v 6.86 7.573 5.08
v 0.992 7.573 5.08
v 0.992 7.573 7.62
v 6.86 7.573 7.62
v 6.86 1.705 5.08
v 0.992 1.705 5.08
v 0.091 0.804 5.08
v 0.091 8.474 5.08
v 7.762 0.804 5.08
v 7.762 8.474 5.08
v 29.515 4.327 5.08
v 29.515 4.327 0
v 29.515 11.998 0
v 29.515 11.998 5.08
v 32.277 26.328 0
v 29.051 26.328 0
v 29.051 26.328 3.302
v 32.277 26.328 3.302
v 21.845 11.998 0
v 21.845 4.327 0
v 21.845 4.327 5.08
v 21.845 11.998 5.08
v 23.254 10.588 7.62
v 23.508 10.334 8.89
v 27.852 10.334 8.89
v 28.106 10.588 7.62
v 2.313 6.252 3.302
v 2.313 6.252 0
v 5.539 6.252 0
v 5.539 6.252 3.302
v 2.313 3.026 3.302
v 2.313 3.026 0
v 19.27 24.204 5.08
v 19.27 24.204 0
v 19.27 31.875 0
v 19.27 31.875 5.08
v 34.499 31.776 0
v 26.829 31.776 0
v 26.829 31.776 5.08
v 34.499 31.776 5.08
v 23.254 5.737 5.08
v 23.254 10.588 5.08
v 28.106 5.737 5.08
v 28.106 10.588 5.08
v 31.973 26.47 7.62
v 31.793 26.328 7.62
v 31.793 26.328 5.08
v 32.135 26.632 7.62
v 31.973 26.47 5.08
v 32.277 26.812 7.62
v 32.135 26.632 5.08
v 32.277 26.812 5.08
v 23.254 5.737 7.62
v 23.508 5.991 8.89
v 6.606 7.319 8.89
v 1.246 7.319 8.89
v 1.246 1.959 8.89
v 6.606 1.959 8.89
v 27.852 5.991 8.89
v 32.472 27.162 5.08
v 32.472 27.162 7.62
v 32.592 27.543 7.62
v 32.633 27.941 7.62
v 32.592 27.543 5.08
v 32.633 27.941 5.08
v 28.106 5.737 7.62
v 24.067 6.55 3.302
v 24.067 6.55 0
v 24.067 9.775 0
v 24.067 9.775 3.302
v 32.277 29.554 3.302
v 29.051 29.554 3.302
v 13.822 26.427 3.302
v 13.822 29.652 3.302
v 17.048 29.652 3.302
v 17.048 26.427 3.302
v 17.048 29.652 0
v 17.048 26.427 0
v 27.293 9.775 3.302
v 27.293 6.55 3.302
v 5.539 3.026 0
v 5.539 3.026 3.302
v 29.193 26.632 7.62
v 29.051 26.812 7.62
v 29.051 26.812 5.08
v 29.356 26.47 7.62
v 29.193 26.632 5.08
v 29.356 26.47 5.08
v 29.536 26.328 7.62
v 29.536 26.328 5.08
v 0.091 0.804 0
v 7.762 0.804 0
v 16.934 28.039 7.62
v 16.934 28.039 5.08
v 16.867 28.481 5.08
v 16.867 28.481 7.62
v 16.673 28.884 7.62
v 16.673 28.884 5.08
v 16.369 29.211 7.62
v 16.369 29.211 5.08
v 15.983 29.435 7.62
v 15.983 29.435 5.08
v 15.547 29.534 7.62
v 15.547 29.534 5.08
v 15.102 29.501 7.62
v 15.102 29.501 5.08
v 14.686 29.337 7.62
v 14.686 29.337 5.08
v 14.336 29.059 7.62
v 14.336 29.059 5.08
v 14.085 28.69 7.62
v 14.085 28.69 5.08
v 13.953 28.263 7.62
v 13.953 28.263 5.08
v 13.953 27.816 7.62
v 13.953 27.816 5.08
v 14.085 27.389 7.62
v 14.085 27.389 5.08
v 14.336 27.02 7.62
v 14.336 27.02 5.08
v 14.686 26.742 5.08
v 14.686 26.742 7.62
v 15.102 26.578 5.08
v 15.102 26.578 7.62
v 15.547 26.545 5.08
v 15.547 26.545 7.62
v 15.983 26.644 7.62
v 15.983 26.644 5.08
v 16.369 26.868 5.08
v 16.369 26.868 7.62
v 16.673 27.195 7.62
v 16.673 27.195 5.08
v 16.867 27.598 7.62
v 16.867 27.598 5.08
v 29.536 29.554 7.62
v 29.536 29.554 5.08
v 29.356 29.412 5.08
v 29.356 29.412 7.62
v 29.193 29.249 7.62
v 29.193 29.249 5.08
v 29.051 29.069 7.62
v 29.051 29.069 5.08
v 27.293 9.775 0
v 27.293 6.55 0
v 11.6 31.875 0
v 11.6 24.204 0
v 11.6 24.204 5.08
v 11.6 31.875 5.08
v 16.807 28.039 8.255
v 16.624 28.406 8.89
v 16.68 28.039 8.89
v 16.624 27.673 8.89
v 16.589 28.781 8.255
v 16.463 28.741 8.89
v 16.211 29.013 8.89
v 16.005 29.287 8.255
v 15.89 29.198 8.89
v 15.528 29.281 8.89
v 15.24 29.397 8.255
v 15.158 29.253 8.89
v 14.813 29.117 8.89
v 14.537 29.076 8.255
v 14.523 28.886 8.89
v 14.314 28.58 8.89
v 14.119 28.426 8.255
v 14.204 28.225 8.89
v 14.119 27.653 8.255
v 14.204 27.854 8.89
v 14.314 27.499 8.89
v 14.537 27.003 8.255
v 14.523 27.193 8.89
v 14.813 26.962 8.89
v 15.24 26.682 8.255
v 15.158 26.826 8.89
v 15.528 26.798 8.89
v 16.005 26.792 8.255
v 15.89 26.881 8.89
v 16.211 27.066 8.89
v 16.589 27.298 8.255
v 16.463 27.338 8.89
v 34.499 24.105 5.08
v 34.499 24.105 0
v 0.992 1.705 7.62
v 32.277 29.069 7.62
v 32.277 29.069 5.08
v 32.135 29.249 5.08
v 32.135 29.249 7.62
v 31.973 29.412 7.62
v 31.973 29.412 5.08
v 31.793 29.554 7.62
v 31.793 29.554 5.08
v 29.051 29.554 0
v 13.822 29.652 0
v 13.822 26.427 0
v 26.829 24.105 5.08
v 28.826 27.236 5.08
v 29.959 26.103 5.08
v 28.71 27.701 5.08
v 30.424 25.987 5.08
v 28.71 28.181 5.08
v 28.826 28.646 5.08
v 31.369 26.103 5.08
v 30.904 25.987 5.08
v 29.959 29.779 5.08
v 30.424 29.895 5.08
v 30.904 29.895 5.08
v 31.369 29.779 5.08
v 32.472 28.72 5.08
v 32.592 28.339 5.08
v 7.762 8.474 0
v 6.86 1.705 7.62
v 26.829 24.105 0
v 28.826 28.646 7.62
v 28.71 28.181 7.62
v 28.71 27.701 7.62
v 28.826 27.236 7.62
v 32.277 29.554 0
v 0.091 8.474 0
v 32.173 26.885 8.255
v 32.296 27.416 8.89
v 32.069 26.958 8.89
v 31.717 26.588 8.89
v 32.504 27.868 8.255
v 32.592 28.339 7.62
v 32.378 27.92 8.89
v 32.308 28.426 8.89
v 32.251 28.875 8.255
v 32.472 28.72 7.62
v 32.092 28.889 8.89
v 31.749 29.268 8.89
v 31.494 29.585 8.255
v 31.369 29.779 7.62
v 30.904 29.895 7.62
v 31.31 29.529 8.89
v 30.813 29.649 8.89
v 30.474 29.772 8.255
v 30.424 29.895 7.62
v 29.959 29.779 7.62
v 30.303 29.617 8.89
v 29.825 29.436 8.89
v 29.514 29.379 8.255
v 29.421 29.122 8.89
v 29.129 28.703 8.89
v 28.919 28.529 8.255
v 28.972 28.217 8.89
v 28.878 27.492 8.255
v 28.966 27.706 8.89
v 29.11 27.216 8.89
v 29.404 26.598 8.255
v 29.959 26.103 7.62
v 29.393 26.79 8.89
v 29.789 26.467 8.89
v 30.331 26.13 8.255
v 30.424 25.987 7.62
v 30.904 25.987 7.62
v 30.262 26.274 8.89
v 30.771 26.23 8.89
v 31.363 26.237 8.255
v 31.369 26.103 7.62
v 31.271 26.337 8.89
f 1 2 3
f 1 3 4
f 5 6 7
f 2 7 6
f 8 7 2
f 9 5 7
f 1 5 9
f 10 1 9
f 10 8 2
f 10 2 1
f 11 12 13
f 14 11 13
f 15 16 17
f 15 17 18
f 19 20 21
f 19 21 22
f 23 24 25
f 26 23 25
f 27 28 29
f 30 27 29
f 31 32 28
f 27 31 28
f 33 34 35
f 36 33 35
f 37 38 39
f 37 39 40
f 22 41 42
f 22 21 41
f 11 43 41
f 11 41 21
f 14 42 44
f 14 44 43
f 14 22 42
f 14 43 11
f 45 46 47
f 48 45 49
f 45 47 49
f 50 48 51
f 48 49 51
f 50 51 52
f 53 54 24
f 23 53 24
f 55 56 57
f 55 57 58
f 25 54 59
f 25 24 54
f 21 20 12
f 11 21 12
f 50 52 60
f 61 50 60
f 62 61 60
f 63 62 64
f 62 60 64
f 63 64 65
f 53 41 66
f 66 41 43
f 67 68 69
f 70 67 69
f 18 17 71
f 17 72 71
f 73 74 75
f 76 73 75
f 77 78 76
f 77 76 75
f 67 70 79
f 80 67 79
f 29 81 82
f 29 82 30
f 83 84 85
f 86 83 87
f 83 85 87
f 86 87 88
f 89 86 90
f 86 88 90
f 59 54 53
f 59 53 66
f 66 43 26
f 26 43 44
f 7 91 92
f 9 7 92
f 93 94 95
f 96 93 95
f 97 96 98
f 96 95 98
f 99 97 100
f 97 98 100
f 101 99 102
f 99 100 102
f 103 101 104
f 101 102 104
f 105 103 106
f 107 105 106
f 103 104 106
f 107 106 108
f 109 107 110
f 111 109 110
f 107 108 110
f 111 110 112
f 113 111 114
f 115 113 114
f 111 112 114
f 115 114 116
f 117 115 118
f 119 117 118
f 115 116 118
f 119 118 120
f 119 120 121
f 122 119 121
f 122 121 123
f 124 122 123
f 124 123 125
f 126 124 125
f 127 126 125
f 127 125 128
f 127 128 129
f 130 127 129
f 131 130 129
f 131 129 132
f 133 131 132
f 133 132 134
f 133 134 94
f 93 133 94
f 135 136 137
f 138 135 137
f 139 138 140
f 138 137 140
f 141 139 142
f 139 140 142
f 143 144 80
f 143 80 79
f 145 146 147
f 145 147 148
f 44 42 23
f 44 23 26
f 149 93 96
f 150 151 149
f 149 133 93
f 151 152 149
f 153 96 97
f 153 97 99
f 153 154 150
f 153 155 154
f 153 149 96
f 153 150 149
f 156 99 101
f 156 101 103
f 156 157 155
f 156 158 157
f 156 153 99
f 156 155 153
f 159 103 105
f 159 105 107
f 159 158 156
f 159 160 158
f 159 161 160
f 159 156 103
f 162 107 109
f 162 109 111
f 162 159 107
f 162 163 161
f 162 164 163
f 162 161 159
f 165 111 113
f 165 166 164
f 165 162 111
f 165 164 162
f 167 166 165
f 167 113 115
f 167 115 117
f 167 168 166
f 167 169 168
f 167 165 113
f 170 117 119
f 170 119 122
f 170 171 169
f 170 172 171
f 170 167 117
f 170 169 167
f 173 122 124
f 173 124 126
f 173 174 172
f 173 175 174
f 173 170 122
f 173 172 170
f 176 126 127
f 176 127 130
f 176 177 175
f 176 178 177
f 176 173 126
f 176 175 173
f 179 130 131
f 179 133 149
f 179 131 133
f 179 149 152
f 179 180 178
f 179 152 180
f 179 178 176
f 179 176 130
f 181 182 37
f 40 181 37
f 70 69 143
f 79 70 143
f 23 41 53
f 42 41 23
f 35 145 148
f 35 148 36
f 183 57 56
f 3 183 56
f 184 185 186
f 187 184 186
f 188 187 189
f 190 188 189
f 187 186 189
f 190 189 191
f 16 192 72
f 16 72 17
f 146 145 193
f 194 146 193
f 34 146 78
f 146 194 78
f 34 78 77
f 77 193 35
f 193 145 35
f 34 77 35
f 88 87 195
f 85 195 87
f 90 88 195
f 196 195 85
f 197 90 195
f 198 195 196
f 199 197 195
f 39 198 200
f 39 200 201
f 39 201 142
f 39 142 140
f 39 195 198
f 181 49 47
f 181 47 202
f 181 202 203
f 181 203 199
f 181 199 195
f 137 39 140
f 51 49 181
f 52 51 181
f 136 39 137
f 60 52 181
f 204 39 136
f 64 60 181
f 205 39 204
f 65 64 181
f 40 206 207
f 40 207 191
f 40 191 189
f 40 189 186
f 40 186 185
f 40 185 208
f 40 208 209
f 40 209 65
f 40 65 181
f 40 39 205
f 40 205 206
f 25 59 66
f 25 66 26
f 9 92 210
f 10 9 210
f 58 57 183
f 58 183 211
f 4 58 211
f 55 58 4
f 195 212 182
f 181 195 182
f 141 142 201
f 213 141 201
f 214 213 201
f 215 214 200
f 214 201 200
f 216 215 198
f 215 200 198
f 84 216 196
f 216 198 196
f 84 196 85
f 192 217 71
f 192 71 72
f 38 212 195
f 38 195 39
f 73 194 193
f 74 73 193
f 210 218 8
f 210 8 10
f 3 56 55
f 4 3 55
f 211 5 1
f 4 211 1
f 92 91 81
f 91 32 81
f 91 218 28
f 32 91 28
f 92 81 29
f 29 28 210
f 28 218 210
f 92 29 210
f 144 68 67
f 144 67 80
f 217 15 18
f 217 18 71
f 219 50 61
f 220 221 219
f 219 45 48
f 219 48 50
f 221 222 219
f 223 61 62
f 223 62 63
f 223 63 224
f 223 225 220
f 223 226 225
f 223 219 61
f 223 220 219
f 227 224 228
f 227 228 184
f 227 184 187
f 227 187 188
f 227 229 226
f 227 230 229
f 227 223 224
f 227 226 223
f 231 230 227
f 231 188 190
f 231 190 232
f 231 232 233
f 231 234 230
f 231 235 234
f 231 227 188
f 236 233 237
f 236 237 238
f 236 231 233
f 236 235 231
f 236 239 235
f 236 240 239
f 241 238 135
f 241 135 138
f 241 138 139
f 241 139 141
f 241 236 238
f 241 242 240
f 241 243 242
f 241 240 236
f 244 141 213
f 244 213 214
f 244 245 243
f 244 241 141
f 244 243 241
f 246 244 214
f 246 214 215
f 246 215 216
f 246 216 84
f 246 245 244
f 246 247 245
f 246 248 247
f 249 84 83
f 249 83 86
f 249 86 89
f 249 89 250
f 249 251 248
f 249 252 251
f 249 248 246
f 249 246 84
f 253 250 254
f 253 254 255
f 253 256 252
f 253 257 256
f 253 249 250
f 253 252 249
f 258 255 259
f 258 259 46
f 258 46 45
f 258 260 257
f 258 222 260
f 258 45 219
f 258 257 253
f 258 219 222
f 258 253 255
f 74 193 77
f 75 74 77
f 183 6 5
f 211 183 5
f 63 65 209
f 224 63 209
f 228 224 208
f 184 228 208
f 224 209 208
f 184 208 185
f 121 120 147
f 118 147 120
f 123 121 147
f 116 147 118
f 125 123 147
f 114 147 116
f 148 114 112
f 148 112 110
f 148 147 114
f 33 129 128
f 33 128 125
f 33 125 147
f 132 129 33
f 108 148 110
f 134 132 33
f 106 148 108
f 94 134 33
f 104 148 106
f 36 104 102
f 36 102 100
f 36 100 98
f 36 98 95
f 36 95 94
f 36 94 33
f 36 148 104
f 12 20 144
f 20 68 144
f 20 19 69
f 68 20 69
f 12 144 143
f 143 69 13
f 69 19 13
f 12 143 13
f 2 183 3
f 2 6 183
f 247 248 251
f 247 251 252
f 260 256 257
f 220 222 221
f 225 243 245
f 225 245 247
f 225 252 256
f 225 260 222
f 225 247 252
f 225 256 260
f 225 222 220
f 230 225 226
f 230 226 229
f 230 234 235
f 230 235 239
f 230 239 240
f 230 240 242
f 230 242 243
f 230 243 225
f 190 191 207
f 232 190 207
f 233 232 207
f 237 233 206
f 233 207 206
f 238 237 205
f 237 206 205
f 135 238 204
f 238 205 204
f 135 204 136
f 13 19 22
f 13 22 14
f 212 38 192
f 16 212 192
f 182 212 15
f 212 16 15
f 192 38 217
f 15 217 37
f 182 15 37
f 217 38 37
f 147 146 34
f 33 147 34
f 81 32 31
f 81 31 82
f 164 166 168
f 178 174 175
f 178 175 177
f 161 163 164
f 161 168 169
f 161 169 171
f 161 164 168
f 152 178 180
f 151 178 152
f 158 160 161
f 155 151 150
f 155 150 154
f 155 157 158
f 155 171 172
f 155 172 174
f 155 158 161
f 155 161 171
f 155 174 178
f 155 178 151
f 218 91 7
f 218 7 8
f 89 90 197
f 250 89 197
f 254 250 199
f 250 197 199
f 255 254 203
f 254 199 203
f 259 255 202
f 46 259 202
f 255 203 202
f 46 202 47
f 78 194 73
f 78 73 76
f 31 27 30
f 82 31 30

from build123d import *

# Parameters (mm, degrees)
F0_W          = 7.6708
F0_H          = 7.6708
F0_W_2        = 5.8674
F0_H_2        = 5.8674
F0_W_3        = 3.2258
F0_H_3        = 3.2258
F1_DEPTH      = 5.08
F0_R          = 1.4986
F0_W_4        = 4.8514
F0_H_4        = 4.8514
F2_DEPTH      = 8.89
F3_DEPTH      = 8.89
F4_DEPTH      = 8.89
F5_DEPTH      = 8.89
F6_C1_SIZE2   = 0.254
F6_C1_SIZE    = 1.27
F6_C2_SIZE2   = 0.254
F6_C2_SIZE    = 1.27
F6_C3_SIZE2   = 0.254
F6_C3_SIZE    = 1.27
F6_C4_SIZE2   = 0.254
F6_C4_SIZE    = 1.27
F6_4_C1_SIZE2 = 0.254
F6_4_C1_SIZE  = 1.27
F6_4_C2_SIZE2 = 0.254
F6_4_C2_SIZE  = 1.27
F6_4_C3_SIZE2 = 0.254
F6_4_C3_SIZE  = 1.27
F6_4_C4_SIZE2 = 0.254
F6_4_C4_SIZE  = 1.27
F7_DEPTH      = 3.302
F8_DEPTH      = 3.302
F9_DEPTH      = 3.302
F10_DEPTH     = 3.302


# Not quite as in the source:
# - a fillet or chamfer that OpenCascade refuses, or shapes differently, is made with other operations: its cross-section is extruded or revolved along the edge and cut away or added


with BuildPart() as f1:
    # F0 (on Top) → F1 (new body)
    with BuildSketch(Plane.XY):
        with Locations((3.9261005717, 4.6390335905)):
            Rectangle(F0_W, F0_H)
        with Locations((3.9261005717, 4.6390335905)):
            Rectangle(F0_W_2, F0_H_2, mode=Mode.SUBTRACT)
        with Locations((3.9261005717, 4.6390335905)):
            Rectangle(F0_W_2, F0_H_2)
        with Locations((3.9261005717, 4.6390335905)):
            Rectangle(F0_W_3, F0_H_3, mode=Mode.SUBTRACT)
        with Locations((3.9261005717, 4.6390335905)):
            Rectangle(F0_W_3, F0_H_3)
    extrude(amount=F1_DEPTH)

    # F0 (on Top) → F5 (join)
    with BuildSketch(Plane.XY):
        with Locations((3.9261005717, 4.6390335905)):
            Rectangle(F0_W_2, F0_H_2)
        with Locations((3.9261005717, 4.6390335905)):
            Rectangle(F0_W_3, F0_H_3, mode=Mode.SUBTRACT)
        with Locations((3.9261005717, 4.6390335905)):
            Rectangle(F0_W_3, F0_H_3)
    extrude(amount=F5_DEPTH)

    # F6: chamfer of 0.254 x 1.27 on 4 edges, made by hand

    # F6_c1
    f6_c1_edges = [f1.edges().sort_by_distance(p)[0] for p in [
        (3.9261005717, 1.7053335905, 8.89),
    ]]
    f6_c1_side = f1.faces().sort_by_distance((3.9261005717, 1.7053335905, 8.88492))[0]
    chamfer(f6_c1_edges, length=F6_C1_SIZE, length2=F6_C1_SIZE2, reference=f6_c1_side)

    # F6_c2
    f6_c2_edges = [f1.edges().sort_by_distance(p)[0] for p in [
        (6.8598005717, 4.7660335905, 8.89),
    ]]
    f6_c2_side = f1.faces().sort_by_distance((6.8598005717, 4.7660335905, 8.88492))[0]
    chamfer(f6_c2_edges, length=F6_C2_SIZE, length2=F6_C2_SIZE2, reference=f6_c2_side)

    # F6_c3
    f6_c3_edges = [f1.edges().sort_by_distance(p)[0] for p in [
        (3.7991005717, 7.5727335905, 8.89),
    ]]
    f6_c3_side = f1.faces().sort_by_distance((3.7991005717, 7.5727335905, 8.88492))[0]
    chamfer(f6_c3_edges, length=F6_C3_SIZE, length2=F6_C3_SIZE2, reference=f6_c3_side)

    # F6_c4
    f6_c4_edges = [f1.edges().sort_by_distance(p)[0] for p in [
        (0.9924005717, 4.6390335905, 8.89),
    ]]
    f6_c4_side = f1.faces().sort_by_distance((0.9924005717, 4.6390335905, 8.88492))[0]
    chamfer(f6_c4_edges, length=F6_C4_SIZE, length2=F6_C4_SIZE2, reference=f6_c4_side)

    # F0 (on Top) → F10 (cut)
    with BuildSketch(Plane.XY):
        with Locations((3.9261005717, 4.6390335905)):
            Rectangle(F0_W_3, F0_H_3)
    extrude(amount=F10_DEPTH, mode=Mode.SUBTRACT)


with BuildPart() as f1b:
    # F0 (on Top) → F1, piece 2 (new body)
    with BuildSketch(Plane.XY):
        with Locations((30.6640900671, 27.9408358037)):
            Rectangle(F0_W, F0_H)
        with BuildLine():
            Line((29.0511900671, 29.0693506862), (29.0511900671, 29.5537358037))
            Line((29.0511900671, 29.5537358037), (29.5355751847, 29.5537358037))
            ThreePointArc((29.5355751847, 29.5537358037), (30.6640900671, 29.9093358037), (31.7926049496, 29.5537358037))
            Line((31.7926049496, 29.5537358037), (32.2769900671, 29.5537358037))
            Line((32.2769900671, 29.5537358037), (32.2769900671, 29.0693506862))
            ThreePointArc((32.2769900671, 29.0693506862), (32.5415865252, 28.5324431904), (32.6325900671, 27.9408358037))
            ThreePointArc((32.6325900671, 27.9408358037), (32.5415865252, 27.349228417), (32.2769900671, 26.8123209213))
            Line((32.2769900671, 26.8123209213), (32.2769900671, 26.3279358037))
            Line((32.2769900671, 26.3279358037), (31.7926049496, 26.3279358037))
            ThreePointArc((31.7926049496, 26.3279358037), (30.6640900671, 25.9723358037), (29.5355751847, 26.3279358037))
            Line((29.5355751847, 26.3279358037), (29.0511900671, 26.3279358037))
            Line((29.0511900671, 26.3279358037), (29.0511900671, 26.8123209213))
            ThreePointArc((29.0511900671, 26.8123209213), (28.6955900671, 27.9408358037), (29.0511900671, 29.0693506862))
        make_face(mode=Mode.SUBTRACT)
        with BuildLine():
            Line((31.7926049496, 29.5537358037), (29.5355751847, 29.5537358037))
            ThreePointArc((29.5355751847, 29.5537358037), (29.2721503684, 29.3327755025), (29.0511900671, 29.0693506862))
            Line((29.0511900671, 29.0693506862), (29.0511900671, 26.8123209213))
            ThreePointArc((29.0511900671, 26.8123209213), (29.2721503684, 26.548896105), (29.5355751847, 26.3279358037))
            Line((29.5355751847, 26.3279358037), (31.7926049496, 26.3279358037))
            ThreePointArc((31.7926049496, 26.3279358037), (32.0560297659, 26.548896105), (32.2769900671, 26.8123209213))
            Line((32.2769900671, 26.8123209213), (32.2769900671, 29.0693506862))
            ThreePointArc((32.2769900671, 29.0693506862), (32.0560297659, 29.3327755025), (31.7926049496, 29.5537358037))
        make_face()
        with BuildLine():
            Line((29.0511900671, 26.8123209213), (29.0511900671, 29.0693506862))
            ThreePointArc((29.0511900671, 29.0693506862), (28.6955900671, 27.9408358037), (29.0511900671, 26.8123209213))
        make_face()
        with BuildLine():
            ThreePointArc((32.6325900671, 27.9408358037), (32.5415865252, 28.5324431904), (32.2769900671, 29.0693506862))
            Line((32.2769900671, 29.0693506862), (32.2769900671, 26.8123209213))
            ThreePointArc((32.2769900671, 26.8123209213), (32.5415865252, 27.349228417), (32.6325900671, 27.9408358037))
        make_face()
        with BuildLine():
            Line((31.7926049496, 26.3279358037), (29.5355751847, 26.3279358037))
            ThreePointArc((29.5355751847, 26.3279358037), (30.6640900671, 25.9723358037), (31.7926049496, 26.3279358037))
        make_face()
        with BuildLine():
            ThreePointArc((31.7926049496, 29.5537358037), (30.6640900671, 29.9093358037), (29.5355751847, 29.5537358037))
            Line((29.5355751847, 29.5537358037), (31.7926049496, 29.5537358037))
        make_face()
        with BuildLine():
            ThreePointArc((29.5355751847, 26.3279358037), (29.2721503684, 26.548896105), (29.0511900671, 26.8123209213))
            Line((29.0511900671, 26.8123209213), (29.0511900671, 26.3279358037))
            Line((29.0511900671, 26.3279358037), (29.5355751847, 26.3279358037))
        make_face()
        with BuildLine():
            Line((29.5355751847, 29.5537358037), (29.0511900671, 29.5537358037))
            Line((29.0511900671, 29.5537358037), (29.0511900671, 29.0693506862))
            ThreePointArc((29.0511900671, 29.0693506862), (29.2721503684, 29.3327755025), (29.5355751847, 29.5537358037))
        make_face()
        with BuildLine():
            Line((32.2769900671, 29.5537358037), (31.7926049496, 29.5537358037))
            ThreePointArc((31.7926049496, 29.5537358037), (32.0560297659, 29.3327755025), (32.2769900671, 29.0693506862))
            Line((32.2769900671, 29.0693506862), (32.2769900671, 29.5537358037))
        make_face()
        with BuildLine():
            Line((32.2769900671, 26.3279358037), (32.2769900671, 26.8123209213))
            ThreePointArc((32.2769900671, 26.8123209213), (32.0560297659, 26.548896105), (31.7926049496, 26.3279358037))
            Line((31.7926049496, 26.3279358037), (32.2769900671, 26.3279358037))
        make_face()
    extrude(amount=F1_DEPTH)

    # F0 (on Top) → F2 (join)
    with BuildSketch(Plane.XY):
        with BuildLine():
            Line((31.7926049496, 26.3279358037), (29.5355751847, 26.3279358037))
            ThreePointArc((29.5355751847, 26.3279358037), (30.6640900671, 25.9723358037), (31.7926049496, 26.3279358037))
        make_face()
        with BuildLine():
            Line((31.7926049496, 29.5537358037), (29.5355751847, 29.5537358037))
            ThreePointArc((29.5355751847, 29.5537358037), (29.2721503684, 29.3327755025), (29.0511900671, 29.0693506862))
            Line((29.0511900671, 29.0693506862), (29.0511900671, 26.8123209213))
            ThreePointArc((29.0511900671, 26.8123209213), (29.2721503684, 26.548896105), (29.5355751847, 26.3279358037))
            Line((29.5355751847, 26.3279358037), (31.7926049496, 26.3279358037))
            ThreePointArc((31.7926049496, 26.3279358037), (32.0560297659, 26.548896105), (32.2769900671, 26.8123209213))
            Line((32.2769900671, 26.8123209213), (32.2769900671, 29.0693506862))
            ThreePointArc((32.2769900671, 29.0693506862), (32.0560297659, 29.3327755025), (31.7926049496, 29.5537358037))
        make_face()
        with BuildLine():
            Line((29.0511900671, 26.8123209213), (29.0511900671, 29.0693506862))
            ThreePointArc((29.0511900671, 29.0693506862), (28.6955900671, 27.9408358037), (29.0511900671, 26.8123209213))
        make_face()
        with BuildLine():
            ThreePointArc((31.7926049496, 29.5537358037), (30.6640900671, 29.9093358037), (29.5355751847, 29.5537358037))
            Line((29.5355751847, 29.5537358037), (31.7926049496, 29.5537358037))
        make_face()
        with BuildLine():
            ThreePointArc((32.6325900671, 27.9408358037), (32.5415865252, 28.5324431904), (32.2769900671, 29.0693506862))
            Line((32.2769900671, 29.0693506862), (32.2769900671, 26.8123209213))
            ThreePointArc((32.2769900671, 26.8123209213), (32.5415865252, 27.349228417), (32.6325900671, 27.9408358037))
        make_face()
    extrude(amount=F2_DEPTH)

    # F6#2: chamfer of 0.254 x 1.27 on 1 edges, made by hand

    # F6_2_s1 → F6_2_t2 (revolve, cut)
    with BuildSketch(Plane(origin=(23.202503455, 33.1615633992, 0), x_dir=(0, 0, 1), z_dir=(-0.5732867069, -0.8193548387, 0))):
        Polygon((7.62, -11.0751608258), (8.89, -10.8211608258), (8.89, -11.0751608258), align=None)
    revolve(axis=Axis((30.6640900671, 27.9408358037, 8.89), (0, 0, 1)), mode=Mode.SUBTRACT)

    # F0 (on Top) → F7 (cut)
    with BuildSketch(Plane.XY):
        with BuildLine():
            Line((31.7926049496, 29.5537358037), (29.5355751847, 29.5537358037))
            ThreePointArc((29.5355751847, 29.5537358037), (29.2721503684, 29.3327755025), (29.0511900671, 29.0693506862))
            Line((29.0511900671, 29.0693506862), (29.0511900671, 26.8123209213))
            ThreePointArc((29.0511900671, 26.8123209213), (29.2721503684, 26.548896105), (29.5355751847, 26.3279358037))
            Line((29.5355751847, 26.3279358037), (31.7926049496, 26.3279358037))
            ThreePointArc((31.7926049496, 26.3279358037), (32.0560297659, 26.548896105), (32.2769900671, 26.8123209213))
            Line((32.2769900671, 26.8123209213), (32.2769900671, 29.0693506862))
            ThreePointArc((32.2769900671, 29.0693506862), (32.0560297659, 29.3327755025), (31.7926049496, 29.5537358037))
        make_face()
        with BuildLine():
            ThreePointArc((29.5355751847, 26.3279358037), (29.2721503684, 26.548896105), (29.0511900671, 26.8123209213))
            Line((29.0511900671, 26.8123209213), (29.0511900671, 26.3279358037))
            Line((29.0511900671, 26.3279358037), (29.5355751847, 26.3279358037))
        make_face()
        with BuildLine():
            Line((32.2769900671, 26.3279358037), (32.2769900671, 26.8123209213))
            ThreePointArc((32.2769900671, 26.8123209213), (32.0560297659, 26.548896105), (31.7926049496, 26.3279358037))
            Line((31.7926049496, 26.3279358037), (32.2769900671, 26.3279358037))
        make_face()
        with BuildLine():
            Line((32.2769900671, 29.5537358037), (31.7926049496, 29.5537358037))
            ThreePointArc((31.7926049496, 29.5537358037), (32.0560297659, 29.3327755025), (32.2769900671, 29.0693506862))
            Line((32.2769900671, 29.0693506862), (32.2769900671, 29.5537358037))
        make_face()
        with BuildLine():
            Line((29.5355751847, 29.5537358037), (29.0511900671, 29.5537358037))
            Line((29.0511900671, 29.5537358037), (29.0511900671, 29.0693506862))
            ThreePointArc((29.0511900671, 29.0693506862), (29.2721503684, 29.3327755025), (29.5355751847, 29.5537358037))
        make_face()
    extrude(amount=F7_DEPTH, mode=Mode.SUBTRACT)


with BuildPart() as f1c:
    # F0 (on Top) → F1, piece 3 (new body)
    with BuildSketch(Plane.XY):
        with Locations((15.4350250959, 28.039496392)):
            Rectangle(F0_W, F0_H)
        with Locations((15.4350250959, 28.039496392)):
            Rectangle(F0_W_3, F0_H_3, mode=Mode.SUBTRACT)
        with Locations((15.4350250959, 28.039496392)):
            Rectangle(F0_W_3, F0_H_3)
        with Locations((15.4350250959, 28.039496392)):
            Circle(F0_R, mode=Mode.SUBTRACT)
        with Locations((15.4350250959, 28.039496392)):
            Circle(F0_R)
    extrude(amount=F1_DEPTH)

    # F0 (on Top) → F3 (join)
    with BuildSketch(Plane.XY):
        with Locations((15.4350250959, 28.039496392)):
            Circle(F0_R)
    extrude(amount=F3_DEPTH)

    # F6#3: chamfer of 0.254 x 1.27 on 1 edges, made by hand

    # F6_3_s1 → F6_3_t2 (revolve, cut)
    with BuildSketch(Plane.XZ.offset(-28.039496392)):
        Polygon((16.9336250959, 7.62), (16.6796250959, 8.89), (16.9336250959, 8.89), align=None)
    revolve(axis=Axis((15.4350250959, 28.039496392, 8.89), (0, 0, 1)), mode=Mode.SUBTRACT)

    # F0 (on Top) → F8 (cut)
    with BuildSketch(Plane.XY):
        with Locations((15.4350250959, 28.039496392)):
            Rectangle(F0_W_3, F0_H_3)
        with Locations((15.4350250959, 28.039496392)):
            Circle(F0_R, mode=Mode.SUBTRACT)
        with Locations((15.4350250959, 28.039496392)):
            Circle(F0_R)
    extrude(amount=F8_DEPTH, mode=Mode.SUBTRACT)


with BuildPart() as f1d:
    # F0 (on Top) → F1, piece 4 (new body)
    with BuildSketch(Plane.XY):
        with Locations((25.6800069869, 8.162417023)):
            Rectangle(F0_W, F0_H)
        with Locations((25.6800069869, 8.162417023)):
            Rectangle(F0_W_4, F0_H_4, mode=Mode.SUBTRACT)
        with Locations((25.6800069869, 8.162417023)):
            Rectangle(F0_W_4, F0_H_4)
        with Locations((25.6800069869, 8.162417023)):
            Rectangle(F0_W_3, F0_H_3, mode=Mode.SUBTRACT)
        with Locations((25.6800069869, 8.162417023)):
            Rectangle(F0_W_3, F0_H_3)
    extrude(amount=F1_DEPTH)

    # F0 (on Top) → F4 (join)
    with BuildSketch(Plane.XY):
        with Locations((25.6800069869, 8.162417023)):
            Rectangle(F0_W_4, F0_H_4)
        with Locations((25.6800069869, 8.162417023)):
            Rectangle(F0_W_3, F0_H_3, mode=Mode.SUBTRACT)
        with Locations((25.6800069869, 8.162417023)):
            Rectangle(F0_W_3, F0_H_3)
    extrude(amount=F4_DEPTH)

    # F6#4: chamfer of 0.254 x 1.27 on 4 edges, made by hand

    # F6_4_c1
    f6_4_c1_edges = [f1d.edges().sort_by_distance(p)[0] for p in [
        (25.6800069869, 10.588117023, 8.89),
    ]]
    f6_4_c1_side = f1d.faces().sort_by_distance((25.6800069869, 10.588117023, 8.88492))[0]
    chamfer(f6_4_c1_edges, length=F6_4_C1_SIZE, length2=F6_4_C1_SIZE2, reference=f6_4_c1_side)

    # F6_4_c2
    f6_4_c2_edges = [f1d.edges().sort_by_distance(p)[0] for p in [
        (23.2543069869, 8.035417023, 8.89),
    ]]
    f6_4_c2_side = f1d.faces().sort_by_distance((23.2543069869, 8.035417023, 8.88492))[0]
    chamfer(f6_4_c2_edges, length=F6_4_C2_SIZE, length2=F6_4_C2_SIZE2, reference=f6_4_c2_side)

    # F6_4_c3
    f6_4_c3_edges = [f1d.edges().sort_by_distance(p)[0] for p in [
        (25.8070069869, 5.736717023, 8.89),
    ]]
    f6_4_c3_side = f1d.faces().sort_by_distance((25.8070069869, 5.736717023, 8.88492))[0]
    chamfer(f6_4_c3_edges, length=F6_4_C3_SIZE, length2=F6_4_C3_SIZE2, reference=f6_4_c3_side)

    # F6_4_c4
    f6_4_c4_edges = [f1d.edges().sort_by_distance(p)[0] for p in [
        (28.1057069869, 8.162417023, 8.89),
    ]]
    f6_4_c4_side = f1d.faces().sort_by_distance((28.1057069869, 8.162417023, 8.88492))[0]
    chamfer(f6_4_c4_edges, length=F6_4_C4_SIZE, length2=F6_4_C4_SIZE2, reference=f6_4_c4_side)

    # F0 (on Top) → F9 (cut)
    with BuildSketch(Plane.XY):
        with Locations((25.6800069869, 8.162417023)):
            Rectangle(F0_W_3, F0_H_3)
    extrude(amount=F9_DEPTH, mode=Mode.SUBTRACT)


solid = Compound([f1.part, f1b.part, f1c.part, f1d.part])
